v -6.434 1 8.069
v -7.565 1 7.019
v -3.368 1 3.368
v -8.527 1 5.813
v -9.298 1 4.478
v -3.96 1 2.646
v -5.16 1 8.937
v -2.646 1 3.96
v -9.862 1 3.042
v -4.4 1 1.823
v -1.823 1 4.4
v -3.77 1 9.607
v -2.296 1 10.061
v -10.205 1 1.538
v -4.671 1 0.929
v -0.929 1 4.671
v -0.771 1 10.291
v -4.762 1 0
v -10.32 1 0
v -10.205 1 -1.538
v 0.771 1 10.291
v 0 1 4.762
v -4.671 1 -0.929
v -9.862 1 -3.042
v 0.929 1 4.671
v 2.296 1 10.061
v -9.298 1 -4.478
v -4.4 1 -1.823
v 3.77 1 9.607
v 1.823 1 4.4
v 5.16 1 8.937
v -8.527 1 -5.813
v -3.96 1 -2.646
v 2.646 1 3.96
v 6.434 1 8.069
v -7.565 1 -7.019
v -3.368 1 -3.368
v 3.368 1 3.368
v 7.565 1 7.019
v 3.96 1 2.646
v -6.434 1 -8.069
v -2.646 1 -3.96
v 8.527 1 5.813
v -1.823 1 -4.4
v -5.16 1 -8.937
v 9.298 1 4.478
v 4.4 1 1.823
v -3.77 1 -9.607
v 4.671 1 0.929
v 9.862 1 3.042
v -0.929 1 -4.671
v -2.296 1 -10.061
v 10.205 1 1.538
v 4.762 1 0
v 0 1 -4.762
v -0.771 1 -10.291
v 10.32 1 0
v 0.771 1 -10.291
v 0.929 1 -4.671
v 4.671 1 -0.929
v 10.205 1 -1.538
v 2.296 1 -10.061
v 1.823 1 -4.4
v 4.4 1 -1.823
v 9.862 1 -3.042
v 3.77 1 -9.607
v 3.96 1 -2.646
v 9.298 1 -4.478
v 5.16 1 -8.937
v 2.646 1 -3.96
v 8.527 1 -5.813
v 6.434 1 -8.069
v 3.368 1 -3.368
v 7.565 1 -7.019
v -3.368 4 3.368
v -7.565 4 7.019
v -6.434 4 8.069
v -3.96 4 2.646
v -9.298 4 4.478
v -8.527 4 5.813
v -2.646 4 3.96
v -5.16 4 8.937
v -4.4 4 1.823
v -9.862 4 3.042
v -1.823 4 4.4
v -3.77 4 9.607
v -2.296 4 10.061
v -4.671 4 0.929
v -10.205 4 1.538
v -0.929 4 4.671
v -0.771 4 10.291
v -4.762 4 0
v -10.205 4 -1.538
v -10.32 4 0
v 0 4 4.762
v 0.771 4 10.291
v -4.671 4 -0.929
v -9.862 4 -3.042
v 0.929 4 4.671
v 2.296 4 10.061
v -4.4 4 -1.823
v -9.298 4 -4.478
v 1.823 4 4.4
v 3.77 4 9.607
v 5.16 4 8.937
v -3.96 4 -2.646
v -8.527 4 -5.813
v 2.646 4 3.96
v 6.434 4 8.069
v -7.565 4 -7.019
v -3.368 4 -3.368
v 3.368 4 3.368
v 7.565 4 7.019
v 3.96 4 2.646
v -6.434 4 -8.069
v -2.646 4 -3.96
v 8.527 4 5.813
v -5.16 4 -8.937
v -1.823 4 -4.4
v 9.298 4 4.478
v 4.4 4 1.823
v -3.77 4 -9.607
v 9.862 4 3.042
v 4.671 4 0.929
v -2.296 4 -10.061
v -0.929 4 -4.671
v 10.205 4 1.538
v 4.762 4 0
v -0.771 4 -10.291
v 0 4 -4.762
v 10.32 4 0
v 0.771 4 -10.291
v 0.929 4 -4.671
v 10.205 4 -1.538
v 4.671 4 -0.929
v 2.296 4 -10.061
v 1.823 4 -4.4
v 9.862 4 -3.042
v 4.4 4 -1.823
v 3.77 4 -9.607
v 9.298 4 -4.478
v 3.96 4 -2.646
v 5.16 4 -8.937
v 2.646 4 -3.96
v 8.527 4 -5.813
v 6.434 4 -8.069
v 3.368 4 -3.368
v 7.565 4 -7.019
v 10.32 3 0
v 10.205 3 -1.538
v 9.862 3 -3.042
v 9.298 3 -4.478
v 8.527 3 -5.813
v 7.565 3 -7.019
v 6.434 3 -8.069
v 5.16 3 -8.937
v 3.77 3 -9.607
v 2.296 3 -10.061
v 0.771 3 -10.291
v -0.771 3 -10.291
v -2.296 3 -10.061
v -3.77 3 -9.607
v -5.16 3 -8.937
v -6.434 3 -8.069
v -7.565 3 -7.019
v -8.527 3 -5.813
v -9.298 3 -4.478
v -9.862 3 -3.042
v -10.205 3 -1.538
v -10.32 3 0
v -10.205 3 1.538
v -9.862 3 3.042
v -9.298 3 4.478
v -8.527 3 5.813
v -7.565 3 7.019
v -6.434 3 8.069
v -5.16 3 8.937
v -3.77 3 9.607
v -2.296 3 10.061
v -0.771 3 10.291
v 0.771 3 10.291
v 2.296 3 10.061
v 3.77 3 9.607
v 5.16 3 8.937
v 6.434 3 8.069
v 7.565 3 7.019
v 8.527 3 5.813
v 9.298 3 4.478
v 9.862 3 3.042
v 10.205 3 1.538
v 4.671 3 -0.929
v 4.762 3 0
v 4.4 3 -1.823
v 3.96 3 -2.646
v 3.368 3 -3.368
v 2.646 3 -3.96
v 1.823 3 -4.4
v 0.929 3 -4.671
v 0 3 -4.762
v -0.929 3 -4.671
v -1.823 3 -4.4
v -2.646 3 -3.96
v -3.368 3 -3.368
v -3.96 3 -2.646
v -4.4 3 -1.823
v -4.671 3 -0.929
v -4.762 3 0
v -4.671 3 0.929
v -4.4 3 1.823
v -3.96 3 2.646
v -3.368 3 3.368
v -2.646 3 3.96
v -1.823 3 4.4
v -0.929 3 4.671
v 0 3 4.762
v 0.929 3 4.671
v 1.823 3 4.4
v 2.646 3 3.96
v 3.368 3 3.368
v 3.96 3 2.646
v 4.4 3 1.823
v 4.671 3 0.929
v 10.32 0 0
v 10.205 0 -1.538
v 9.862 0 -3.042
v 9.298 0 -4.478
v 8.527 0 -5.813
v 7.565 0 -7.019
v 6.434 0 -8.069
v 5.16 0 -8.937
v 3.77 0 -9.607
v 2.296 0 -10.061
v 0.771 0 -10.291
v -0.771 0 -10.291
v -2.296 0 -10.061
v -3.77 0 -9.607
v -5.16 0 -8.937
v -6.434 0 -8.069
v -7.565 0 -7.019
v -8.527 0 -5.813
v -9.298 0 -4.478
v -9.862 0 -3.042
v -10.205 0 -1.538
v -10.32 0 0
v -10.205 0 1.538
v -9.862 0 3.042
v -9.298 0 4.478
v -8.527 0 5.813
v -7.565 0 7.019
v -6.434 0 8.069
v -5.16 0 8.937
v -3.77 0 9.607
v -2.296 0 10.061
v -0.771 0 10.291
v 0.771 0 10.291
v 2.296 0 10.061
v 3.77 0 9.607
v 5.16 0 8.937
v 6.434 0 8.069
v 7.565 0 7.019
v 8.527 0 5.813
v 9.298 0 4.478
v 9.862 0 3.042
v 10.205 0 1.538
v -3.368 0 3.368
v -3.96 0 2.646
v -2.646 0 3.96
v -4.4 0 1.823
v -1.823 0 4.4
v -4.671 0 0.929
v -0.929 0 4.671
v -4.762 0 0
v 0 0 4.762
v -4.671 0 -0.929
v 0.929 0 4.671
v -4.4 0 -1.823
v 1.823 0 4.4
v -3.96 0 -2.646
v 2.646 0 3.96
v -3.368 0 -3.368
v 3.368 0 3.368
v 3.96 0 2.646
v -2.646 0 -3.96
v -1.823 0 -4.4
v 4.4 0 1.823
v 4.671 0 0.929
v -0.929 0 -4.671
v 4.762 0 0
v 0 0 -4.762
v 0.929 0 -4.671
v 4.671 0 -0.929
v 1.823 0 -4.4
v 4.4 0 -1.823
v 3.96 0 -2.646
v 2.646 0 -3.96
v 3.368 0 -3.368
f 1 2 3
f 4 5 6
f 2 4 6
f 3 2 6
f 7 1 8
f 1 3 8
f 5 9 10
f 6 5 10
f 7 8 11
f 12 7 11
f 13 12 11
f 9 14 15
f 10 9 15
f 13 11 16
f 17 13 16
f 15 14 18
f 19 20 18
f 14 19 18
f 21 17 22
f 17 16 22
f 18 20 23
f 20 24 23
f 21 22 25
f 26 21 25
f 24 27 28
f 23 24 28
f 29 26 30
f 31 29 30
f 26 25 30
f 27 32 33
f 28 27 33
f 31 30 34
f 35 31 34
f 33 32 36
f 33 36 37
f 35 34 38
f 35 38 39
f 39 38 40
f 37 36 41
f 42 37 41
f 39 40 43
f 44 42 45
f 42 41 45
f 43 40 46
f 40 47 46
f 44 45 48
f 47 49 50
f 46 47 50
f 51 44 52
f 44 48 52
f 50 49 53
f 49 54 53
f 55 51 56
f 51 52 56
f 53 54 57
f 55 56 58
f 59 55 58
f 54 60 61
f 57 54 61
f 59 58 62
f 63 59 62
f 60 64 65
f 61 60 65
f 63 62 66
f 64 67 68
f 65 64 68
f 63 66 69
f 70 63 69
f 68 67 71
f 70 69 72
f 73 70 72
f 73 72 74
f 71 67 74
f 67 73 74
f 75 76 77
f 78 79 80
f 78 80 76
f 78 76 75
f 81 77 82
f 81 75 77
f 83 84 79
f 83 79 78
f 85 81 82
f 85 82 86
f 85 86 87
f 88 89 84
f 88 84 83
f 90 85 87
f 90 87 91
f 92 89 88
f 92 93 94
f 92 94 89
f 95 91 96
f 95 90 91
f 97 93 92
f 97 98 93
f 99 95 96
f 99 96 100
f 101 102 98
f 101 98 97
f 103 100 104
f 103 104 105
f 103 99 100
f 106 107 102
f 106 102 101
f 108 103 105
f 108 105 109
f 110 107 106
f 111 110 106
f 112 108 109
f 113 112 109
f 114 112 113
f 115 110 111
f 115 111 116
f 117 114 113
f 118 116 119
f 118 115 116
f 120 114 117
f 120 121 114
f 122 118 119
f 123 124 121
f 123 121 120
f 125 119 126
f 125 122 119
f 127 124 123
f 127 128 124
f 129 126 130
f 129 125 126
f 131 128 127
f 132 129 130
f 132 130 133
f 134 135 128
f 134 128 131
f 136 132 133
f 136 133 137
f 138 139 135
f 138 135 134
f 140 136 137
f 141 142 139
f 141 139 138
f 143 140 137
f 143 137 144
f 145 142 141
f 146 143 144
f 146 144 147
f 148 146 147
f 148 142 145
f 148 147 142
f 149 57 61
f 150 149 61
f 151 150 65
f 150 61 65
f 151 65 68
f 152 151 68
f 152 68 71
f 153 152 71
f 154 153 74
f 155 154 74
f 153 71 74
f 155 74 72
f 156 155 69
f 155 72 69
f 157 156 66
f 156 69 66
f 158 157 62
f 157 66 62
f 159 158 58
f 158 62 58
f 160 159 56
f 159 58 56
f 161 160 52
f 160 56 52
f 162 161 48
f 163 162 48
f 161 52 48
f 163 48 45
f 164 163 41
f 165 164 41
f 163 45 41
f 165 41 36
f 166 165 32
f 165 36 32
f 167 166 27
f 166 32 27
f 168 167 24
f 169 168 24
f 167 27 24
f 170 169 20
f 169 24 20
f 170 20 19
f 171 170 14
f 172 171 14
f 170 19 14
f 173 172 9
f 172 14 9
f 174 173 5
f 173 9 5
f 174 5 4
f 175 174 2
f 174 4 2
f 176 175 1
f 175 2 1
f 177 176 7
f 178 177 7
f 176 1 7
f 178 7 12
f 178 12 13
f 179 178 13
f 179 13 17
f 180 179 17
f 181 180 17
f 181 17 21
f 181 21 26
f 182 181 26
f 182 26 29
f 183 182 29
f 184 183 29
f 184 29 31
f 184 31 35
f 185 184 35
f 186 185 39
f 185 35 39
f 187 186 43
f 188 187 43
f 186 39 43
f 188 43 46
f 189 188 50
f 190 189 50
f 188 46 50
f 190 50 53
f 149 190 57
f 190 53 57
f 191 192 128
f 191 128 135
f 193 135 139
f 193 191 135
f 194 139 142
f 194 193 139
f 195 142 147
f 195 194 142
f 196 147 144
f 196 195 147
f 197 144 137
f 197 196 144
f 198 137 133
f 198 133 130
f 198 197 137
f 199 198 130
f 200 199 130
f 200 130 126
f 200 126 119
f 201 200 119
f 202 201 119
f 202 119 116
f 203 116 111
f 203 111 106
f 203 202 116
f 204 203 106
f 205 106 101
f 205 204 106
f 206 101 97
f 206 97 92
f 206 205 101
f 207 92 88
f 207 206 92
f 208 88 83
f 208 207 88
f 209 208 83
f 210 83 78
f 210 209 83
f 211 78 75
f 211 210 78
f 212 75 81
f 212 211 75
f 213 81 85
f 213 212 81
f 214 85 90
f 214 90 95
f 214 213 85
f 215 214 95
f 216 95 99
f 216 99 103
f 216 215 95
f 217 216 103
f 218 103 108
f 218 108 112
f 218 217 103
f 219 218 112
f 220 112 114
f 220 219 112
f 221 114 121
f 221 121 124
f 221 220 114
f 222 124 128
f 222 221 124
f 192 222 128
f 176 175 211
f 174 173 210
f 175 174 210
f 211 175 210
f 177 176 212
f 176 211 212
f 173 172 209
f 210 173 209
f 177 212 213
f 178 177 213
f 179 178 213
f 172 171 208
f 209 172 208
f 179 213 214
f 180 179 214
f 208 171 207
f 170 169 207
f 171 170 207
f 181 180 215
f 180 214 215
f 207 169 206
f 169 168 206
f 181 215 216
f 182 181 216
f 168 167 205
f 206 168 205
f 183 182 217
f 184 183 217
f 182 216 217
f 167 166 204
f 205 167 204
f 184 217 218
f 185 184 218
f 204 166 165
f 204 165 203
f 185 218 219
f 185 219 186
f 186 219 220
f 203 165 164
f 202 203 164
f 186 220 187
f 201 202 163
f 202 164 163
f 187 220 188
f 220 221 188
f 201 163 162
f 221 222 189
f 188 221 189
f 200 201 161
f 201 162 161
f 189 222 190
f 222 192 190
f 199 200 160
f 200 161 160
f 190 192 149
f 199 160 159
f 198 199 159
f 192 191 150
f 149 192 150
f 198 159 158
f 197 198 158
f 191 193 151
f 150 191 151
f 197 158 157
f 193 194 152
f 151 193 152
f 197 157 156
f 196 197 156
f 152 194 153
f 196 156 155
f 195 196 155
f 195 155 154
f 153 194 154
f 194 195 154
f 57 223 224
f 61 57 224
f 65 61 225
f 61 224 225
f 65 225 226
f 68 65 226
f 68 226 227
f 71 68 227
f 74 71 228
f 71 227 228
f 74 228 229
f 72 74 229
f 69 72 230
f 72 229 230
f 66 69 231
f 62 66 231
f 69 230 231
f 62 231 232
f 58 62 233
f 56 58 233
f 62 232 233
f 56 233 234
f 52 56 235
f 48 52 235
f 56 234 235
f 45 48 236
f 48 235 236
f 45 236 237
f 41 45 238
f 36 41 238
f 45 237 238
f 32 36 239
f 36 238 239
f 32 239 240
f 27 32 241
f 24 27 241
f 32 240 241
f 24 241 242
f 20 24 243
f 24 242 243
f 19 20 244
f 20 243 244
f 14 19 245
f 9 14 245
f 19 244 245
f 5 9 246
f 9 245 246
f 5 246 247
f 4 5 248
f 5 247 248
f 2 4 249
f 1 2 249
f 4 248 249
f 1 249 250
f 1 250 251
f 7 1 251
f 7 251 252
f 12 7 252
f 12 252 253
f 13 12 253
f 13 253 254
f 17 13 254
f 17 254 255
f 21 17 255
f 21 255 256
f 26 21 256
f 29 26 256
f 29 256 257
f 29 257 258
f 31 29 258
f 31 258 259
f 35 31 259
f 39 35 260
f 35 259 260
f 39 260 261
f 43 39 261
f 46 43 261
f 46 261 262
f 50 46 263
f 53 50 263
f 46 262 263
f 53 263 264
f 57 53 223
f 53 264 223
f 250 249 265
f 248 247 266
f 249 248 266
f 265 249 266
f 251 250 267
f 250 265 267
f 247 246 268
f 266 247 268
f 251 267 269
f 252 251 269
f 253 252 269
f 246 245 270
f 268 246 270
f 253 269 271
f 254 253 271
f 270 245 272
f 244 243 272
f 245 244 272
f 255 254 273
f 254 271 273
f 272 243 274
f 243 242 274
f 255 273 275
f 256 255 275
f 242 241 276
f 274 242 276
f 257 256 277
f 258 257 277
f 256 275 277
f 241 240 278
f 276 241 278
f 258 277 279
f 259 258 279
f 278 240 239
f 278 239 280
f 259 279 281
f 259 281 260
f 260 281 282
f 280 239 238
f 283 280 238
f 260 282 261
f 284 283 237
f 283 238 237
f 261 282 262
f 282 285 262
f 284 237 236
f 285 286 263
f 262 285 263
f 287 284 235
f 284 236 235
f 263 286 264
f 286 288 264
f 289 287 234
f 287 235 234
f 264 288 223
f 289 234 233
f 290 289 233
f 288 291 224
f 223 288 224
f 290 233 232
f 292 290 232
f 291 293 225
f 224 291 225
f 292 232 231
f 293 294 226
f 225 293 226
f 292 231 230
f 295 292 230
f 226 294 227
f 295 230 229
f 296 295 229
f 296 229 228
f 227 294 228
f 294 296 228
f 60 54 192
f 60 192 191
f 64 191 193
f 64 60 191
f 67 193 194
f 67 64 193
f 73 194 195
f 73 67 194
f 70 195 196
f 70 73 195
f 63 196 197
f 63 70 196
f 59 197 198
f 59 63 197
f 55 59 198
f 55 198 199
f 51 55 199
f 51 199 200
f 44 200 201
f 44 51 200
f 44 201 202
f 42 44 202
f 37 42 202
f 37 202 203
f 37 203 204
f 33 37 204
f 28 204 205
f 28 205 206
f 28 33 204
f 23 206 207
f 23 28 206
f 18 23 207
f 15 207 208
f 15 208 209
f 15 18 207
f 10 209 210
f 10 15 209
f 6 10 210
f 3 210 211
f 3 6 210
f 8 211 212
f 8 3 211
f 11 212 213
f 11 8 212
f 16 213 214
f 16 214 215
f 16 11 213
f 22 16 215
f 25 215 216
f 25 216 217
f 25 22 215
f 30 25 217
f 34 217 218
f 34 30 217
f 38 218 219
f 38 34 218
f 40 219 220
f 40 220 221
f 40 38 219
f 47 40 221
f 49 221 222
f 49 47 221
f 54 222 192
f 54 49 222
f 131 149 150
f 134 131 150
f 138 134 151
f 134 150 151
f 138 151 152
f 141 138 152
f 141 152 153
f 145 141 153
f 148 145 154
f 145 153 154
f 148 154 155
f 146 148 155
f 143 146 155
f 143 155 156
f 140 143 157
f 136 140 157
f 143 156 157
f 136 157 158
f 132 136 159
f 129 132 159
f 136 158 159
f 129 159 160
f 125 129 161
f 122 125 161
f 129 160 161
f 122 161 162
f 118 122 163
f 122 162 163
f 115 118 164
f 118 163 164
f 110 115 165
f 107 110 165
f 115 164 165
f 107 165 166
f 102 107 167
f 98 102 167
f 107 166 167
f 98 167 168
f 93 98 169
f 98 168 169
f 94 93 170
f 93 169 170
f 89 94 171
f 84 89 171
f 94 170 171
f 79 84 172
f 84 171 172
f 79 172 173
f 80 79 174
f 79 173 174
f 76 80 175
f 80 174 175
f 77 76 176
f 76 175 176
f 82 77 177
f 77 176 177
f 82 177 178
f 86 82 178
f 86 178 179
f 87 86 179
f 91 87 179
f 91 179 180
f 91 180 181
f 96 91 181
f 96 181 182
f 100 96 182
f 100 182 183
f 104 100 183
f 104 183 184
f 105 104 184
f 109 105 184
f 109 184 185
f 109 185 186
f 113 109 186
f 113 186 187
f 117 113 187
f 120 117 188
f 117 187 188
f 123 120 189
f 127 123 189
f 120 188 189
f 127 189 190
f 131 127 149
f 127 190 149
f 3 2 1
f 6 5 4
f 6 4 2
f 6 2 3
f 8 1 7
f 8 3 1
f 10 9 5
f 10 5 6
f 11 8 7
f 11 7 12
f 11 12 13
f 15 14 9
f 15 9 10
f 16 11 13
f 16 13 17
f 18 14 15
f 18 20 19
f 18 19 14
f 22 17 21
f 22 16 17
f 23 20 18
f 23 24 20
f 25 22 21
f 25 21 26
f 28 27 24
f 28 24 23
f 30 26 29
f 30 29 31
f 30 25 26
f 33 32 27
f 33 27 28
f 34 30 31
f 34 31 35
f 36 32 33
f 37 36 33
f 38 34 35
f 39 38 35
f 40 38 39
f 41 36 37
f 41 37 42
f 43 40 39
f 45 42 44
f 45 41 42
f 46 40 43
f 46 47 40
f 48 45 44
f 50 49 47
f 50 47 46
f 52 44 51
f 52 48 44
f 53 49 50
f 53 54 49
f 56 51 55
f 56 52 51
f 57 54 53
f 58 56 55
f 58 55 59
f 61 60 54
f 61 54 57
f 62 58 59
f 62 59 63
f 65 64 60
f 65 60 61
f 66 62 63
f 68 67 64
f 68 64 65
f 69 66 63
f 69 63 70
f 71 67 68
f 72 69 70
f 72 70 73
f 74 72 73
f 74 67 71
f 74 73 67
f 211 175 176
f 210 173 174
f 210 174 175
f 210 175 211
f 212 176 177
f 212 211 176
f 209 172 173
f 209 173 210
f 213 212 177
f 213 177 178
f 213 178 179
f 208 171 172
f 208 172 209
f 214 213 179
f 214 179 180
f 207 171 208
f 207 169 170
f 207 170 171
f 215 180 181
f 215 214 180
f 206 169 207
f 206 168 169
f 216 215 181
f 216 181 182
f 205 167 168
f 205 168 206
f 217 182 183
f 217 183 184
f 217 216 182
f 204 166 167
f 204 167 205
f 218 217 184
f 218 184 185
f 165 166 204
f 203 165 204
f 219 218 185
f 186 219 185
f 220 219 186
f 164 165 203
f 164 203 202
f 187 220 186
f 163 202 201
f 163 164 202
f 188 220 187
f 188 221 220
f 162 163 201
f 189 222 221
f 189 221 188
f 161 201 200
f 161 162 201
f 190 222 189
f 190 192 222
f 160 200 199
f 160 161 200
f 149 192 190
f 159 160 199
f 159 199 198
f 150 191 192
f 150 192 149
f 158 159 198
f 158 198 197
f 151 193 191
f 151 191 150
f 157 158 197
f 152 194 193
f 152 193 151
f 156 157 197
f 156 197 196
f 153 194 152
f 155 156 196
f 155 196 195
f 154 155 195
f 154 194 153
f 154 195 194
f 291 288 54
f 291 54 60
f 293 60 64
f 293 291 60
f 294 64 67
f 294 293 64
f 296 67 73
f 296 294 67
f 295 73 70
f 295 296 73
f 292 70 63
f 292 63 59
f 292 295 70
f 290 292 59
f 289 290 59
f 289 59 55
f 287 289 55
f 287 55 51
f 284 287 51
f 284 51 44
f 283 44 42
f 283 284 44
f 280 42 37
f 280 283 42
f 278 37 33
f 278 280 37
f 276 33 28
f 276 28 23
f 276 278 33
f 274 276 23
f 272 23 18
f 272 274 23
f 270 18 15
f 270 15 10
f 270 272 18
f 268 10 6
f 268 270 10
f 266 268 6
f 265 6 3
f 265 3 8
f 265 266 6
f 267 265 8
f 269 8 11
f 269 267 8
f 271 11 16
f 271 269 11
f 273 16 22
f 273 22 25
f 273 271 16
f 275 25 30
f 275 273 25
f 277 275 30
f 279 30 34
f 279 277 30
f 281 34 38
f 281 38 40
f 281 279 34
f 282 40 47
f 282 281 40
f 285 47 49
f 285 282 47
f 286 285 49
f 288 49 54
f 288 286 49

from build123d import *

# Parameters (mm, degrees)
SKETCH1_R           = 10.32
SKETCH1_R_2         = 4.7625
BOSS_EXTRUDE1_DEPTH = 1
SKETCH2_R           = 10.32
SKETCH2_R_2         = 4.7625
BOSS_EXTRUDE2_DEPTH = 2
SKETCH3_R           = 10.32
SKETCH3_R_2         = 4.7625
BOSS_EXTRUDE3_DEPTH = 1


with BuildPart() as part:
    # Sketch1 → Boss-Extrude1 (new body)
    with BuildSketch(Plane(origin=(0, 0, 0), x_dir=(1, 0, 0), z_dir=(0, 1, 0))):
        Circle(SKETCH1_R)
        Circle(SKETCH1_R_2, mode=Mode.SUBTRACT)
    extrude(amount=BOSS_EXTRUDE1_DEPTH)


with BuildPart() as body_2:
    # Sketch2 → Boss-Extrude2 (new body)
    with BuildSketch(Plane(origin=(0, 1, 0), x_dir=(1, 0, 0), z_dir=(0, 1, 0))):
        Circle(SKETCH2_R)
        Circle(SKETCH2_R_2, mode=Mode.SUBTRACT)
    extrude(amount=BOSS_EXTRUDE2_DEPTH)


with BuildPart() as body_3:
    # Sketch3 → Boss-Extrude3 (new body)
    with BuildSketch(Plane(origin=(0, 3, 0), x_dir=(1, 0, 0), z_dir=(0, 1, 0))):
        Circle(SKETCH3_R)
        Circle(SKETCH3_R_2, mode=Mode.SUBTRACT)
    extrude(amount=BOSS_EXTRUDE3_DEPTH)


solid = Compound([part.part, body_2.part, body_3.part])
